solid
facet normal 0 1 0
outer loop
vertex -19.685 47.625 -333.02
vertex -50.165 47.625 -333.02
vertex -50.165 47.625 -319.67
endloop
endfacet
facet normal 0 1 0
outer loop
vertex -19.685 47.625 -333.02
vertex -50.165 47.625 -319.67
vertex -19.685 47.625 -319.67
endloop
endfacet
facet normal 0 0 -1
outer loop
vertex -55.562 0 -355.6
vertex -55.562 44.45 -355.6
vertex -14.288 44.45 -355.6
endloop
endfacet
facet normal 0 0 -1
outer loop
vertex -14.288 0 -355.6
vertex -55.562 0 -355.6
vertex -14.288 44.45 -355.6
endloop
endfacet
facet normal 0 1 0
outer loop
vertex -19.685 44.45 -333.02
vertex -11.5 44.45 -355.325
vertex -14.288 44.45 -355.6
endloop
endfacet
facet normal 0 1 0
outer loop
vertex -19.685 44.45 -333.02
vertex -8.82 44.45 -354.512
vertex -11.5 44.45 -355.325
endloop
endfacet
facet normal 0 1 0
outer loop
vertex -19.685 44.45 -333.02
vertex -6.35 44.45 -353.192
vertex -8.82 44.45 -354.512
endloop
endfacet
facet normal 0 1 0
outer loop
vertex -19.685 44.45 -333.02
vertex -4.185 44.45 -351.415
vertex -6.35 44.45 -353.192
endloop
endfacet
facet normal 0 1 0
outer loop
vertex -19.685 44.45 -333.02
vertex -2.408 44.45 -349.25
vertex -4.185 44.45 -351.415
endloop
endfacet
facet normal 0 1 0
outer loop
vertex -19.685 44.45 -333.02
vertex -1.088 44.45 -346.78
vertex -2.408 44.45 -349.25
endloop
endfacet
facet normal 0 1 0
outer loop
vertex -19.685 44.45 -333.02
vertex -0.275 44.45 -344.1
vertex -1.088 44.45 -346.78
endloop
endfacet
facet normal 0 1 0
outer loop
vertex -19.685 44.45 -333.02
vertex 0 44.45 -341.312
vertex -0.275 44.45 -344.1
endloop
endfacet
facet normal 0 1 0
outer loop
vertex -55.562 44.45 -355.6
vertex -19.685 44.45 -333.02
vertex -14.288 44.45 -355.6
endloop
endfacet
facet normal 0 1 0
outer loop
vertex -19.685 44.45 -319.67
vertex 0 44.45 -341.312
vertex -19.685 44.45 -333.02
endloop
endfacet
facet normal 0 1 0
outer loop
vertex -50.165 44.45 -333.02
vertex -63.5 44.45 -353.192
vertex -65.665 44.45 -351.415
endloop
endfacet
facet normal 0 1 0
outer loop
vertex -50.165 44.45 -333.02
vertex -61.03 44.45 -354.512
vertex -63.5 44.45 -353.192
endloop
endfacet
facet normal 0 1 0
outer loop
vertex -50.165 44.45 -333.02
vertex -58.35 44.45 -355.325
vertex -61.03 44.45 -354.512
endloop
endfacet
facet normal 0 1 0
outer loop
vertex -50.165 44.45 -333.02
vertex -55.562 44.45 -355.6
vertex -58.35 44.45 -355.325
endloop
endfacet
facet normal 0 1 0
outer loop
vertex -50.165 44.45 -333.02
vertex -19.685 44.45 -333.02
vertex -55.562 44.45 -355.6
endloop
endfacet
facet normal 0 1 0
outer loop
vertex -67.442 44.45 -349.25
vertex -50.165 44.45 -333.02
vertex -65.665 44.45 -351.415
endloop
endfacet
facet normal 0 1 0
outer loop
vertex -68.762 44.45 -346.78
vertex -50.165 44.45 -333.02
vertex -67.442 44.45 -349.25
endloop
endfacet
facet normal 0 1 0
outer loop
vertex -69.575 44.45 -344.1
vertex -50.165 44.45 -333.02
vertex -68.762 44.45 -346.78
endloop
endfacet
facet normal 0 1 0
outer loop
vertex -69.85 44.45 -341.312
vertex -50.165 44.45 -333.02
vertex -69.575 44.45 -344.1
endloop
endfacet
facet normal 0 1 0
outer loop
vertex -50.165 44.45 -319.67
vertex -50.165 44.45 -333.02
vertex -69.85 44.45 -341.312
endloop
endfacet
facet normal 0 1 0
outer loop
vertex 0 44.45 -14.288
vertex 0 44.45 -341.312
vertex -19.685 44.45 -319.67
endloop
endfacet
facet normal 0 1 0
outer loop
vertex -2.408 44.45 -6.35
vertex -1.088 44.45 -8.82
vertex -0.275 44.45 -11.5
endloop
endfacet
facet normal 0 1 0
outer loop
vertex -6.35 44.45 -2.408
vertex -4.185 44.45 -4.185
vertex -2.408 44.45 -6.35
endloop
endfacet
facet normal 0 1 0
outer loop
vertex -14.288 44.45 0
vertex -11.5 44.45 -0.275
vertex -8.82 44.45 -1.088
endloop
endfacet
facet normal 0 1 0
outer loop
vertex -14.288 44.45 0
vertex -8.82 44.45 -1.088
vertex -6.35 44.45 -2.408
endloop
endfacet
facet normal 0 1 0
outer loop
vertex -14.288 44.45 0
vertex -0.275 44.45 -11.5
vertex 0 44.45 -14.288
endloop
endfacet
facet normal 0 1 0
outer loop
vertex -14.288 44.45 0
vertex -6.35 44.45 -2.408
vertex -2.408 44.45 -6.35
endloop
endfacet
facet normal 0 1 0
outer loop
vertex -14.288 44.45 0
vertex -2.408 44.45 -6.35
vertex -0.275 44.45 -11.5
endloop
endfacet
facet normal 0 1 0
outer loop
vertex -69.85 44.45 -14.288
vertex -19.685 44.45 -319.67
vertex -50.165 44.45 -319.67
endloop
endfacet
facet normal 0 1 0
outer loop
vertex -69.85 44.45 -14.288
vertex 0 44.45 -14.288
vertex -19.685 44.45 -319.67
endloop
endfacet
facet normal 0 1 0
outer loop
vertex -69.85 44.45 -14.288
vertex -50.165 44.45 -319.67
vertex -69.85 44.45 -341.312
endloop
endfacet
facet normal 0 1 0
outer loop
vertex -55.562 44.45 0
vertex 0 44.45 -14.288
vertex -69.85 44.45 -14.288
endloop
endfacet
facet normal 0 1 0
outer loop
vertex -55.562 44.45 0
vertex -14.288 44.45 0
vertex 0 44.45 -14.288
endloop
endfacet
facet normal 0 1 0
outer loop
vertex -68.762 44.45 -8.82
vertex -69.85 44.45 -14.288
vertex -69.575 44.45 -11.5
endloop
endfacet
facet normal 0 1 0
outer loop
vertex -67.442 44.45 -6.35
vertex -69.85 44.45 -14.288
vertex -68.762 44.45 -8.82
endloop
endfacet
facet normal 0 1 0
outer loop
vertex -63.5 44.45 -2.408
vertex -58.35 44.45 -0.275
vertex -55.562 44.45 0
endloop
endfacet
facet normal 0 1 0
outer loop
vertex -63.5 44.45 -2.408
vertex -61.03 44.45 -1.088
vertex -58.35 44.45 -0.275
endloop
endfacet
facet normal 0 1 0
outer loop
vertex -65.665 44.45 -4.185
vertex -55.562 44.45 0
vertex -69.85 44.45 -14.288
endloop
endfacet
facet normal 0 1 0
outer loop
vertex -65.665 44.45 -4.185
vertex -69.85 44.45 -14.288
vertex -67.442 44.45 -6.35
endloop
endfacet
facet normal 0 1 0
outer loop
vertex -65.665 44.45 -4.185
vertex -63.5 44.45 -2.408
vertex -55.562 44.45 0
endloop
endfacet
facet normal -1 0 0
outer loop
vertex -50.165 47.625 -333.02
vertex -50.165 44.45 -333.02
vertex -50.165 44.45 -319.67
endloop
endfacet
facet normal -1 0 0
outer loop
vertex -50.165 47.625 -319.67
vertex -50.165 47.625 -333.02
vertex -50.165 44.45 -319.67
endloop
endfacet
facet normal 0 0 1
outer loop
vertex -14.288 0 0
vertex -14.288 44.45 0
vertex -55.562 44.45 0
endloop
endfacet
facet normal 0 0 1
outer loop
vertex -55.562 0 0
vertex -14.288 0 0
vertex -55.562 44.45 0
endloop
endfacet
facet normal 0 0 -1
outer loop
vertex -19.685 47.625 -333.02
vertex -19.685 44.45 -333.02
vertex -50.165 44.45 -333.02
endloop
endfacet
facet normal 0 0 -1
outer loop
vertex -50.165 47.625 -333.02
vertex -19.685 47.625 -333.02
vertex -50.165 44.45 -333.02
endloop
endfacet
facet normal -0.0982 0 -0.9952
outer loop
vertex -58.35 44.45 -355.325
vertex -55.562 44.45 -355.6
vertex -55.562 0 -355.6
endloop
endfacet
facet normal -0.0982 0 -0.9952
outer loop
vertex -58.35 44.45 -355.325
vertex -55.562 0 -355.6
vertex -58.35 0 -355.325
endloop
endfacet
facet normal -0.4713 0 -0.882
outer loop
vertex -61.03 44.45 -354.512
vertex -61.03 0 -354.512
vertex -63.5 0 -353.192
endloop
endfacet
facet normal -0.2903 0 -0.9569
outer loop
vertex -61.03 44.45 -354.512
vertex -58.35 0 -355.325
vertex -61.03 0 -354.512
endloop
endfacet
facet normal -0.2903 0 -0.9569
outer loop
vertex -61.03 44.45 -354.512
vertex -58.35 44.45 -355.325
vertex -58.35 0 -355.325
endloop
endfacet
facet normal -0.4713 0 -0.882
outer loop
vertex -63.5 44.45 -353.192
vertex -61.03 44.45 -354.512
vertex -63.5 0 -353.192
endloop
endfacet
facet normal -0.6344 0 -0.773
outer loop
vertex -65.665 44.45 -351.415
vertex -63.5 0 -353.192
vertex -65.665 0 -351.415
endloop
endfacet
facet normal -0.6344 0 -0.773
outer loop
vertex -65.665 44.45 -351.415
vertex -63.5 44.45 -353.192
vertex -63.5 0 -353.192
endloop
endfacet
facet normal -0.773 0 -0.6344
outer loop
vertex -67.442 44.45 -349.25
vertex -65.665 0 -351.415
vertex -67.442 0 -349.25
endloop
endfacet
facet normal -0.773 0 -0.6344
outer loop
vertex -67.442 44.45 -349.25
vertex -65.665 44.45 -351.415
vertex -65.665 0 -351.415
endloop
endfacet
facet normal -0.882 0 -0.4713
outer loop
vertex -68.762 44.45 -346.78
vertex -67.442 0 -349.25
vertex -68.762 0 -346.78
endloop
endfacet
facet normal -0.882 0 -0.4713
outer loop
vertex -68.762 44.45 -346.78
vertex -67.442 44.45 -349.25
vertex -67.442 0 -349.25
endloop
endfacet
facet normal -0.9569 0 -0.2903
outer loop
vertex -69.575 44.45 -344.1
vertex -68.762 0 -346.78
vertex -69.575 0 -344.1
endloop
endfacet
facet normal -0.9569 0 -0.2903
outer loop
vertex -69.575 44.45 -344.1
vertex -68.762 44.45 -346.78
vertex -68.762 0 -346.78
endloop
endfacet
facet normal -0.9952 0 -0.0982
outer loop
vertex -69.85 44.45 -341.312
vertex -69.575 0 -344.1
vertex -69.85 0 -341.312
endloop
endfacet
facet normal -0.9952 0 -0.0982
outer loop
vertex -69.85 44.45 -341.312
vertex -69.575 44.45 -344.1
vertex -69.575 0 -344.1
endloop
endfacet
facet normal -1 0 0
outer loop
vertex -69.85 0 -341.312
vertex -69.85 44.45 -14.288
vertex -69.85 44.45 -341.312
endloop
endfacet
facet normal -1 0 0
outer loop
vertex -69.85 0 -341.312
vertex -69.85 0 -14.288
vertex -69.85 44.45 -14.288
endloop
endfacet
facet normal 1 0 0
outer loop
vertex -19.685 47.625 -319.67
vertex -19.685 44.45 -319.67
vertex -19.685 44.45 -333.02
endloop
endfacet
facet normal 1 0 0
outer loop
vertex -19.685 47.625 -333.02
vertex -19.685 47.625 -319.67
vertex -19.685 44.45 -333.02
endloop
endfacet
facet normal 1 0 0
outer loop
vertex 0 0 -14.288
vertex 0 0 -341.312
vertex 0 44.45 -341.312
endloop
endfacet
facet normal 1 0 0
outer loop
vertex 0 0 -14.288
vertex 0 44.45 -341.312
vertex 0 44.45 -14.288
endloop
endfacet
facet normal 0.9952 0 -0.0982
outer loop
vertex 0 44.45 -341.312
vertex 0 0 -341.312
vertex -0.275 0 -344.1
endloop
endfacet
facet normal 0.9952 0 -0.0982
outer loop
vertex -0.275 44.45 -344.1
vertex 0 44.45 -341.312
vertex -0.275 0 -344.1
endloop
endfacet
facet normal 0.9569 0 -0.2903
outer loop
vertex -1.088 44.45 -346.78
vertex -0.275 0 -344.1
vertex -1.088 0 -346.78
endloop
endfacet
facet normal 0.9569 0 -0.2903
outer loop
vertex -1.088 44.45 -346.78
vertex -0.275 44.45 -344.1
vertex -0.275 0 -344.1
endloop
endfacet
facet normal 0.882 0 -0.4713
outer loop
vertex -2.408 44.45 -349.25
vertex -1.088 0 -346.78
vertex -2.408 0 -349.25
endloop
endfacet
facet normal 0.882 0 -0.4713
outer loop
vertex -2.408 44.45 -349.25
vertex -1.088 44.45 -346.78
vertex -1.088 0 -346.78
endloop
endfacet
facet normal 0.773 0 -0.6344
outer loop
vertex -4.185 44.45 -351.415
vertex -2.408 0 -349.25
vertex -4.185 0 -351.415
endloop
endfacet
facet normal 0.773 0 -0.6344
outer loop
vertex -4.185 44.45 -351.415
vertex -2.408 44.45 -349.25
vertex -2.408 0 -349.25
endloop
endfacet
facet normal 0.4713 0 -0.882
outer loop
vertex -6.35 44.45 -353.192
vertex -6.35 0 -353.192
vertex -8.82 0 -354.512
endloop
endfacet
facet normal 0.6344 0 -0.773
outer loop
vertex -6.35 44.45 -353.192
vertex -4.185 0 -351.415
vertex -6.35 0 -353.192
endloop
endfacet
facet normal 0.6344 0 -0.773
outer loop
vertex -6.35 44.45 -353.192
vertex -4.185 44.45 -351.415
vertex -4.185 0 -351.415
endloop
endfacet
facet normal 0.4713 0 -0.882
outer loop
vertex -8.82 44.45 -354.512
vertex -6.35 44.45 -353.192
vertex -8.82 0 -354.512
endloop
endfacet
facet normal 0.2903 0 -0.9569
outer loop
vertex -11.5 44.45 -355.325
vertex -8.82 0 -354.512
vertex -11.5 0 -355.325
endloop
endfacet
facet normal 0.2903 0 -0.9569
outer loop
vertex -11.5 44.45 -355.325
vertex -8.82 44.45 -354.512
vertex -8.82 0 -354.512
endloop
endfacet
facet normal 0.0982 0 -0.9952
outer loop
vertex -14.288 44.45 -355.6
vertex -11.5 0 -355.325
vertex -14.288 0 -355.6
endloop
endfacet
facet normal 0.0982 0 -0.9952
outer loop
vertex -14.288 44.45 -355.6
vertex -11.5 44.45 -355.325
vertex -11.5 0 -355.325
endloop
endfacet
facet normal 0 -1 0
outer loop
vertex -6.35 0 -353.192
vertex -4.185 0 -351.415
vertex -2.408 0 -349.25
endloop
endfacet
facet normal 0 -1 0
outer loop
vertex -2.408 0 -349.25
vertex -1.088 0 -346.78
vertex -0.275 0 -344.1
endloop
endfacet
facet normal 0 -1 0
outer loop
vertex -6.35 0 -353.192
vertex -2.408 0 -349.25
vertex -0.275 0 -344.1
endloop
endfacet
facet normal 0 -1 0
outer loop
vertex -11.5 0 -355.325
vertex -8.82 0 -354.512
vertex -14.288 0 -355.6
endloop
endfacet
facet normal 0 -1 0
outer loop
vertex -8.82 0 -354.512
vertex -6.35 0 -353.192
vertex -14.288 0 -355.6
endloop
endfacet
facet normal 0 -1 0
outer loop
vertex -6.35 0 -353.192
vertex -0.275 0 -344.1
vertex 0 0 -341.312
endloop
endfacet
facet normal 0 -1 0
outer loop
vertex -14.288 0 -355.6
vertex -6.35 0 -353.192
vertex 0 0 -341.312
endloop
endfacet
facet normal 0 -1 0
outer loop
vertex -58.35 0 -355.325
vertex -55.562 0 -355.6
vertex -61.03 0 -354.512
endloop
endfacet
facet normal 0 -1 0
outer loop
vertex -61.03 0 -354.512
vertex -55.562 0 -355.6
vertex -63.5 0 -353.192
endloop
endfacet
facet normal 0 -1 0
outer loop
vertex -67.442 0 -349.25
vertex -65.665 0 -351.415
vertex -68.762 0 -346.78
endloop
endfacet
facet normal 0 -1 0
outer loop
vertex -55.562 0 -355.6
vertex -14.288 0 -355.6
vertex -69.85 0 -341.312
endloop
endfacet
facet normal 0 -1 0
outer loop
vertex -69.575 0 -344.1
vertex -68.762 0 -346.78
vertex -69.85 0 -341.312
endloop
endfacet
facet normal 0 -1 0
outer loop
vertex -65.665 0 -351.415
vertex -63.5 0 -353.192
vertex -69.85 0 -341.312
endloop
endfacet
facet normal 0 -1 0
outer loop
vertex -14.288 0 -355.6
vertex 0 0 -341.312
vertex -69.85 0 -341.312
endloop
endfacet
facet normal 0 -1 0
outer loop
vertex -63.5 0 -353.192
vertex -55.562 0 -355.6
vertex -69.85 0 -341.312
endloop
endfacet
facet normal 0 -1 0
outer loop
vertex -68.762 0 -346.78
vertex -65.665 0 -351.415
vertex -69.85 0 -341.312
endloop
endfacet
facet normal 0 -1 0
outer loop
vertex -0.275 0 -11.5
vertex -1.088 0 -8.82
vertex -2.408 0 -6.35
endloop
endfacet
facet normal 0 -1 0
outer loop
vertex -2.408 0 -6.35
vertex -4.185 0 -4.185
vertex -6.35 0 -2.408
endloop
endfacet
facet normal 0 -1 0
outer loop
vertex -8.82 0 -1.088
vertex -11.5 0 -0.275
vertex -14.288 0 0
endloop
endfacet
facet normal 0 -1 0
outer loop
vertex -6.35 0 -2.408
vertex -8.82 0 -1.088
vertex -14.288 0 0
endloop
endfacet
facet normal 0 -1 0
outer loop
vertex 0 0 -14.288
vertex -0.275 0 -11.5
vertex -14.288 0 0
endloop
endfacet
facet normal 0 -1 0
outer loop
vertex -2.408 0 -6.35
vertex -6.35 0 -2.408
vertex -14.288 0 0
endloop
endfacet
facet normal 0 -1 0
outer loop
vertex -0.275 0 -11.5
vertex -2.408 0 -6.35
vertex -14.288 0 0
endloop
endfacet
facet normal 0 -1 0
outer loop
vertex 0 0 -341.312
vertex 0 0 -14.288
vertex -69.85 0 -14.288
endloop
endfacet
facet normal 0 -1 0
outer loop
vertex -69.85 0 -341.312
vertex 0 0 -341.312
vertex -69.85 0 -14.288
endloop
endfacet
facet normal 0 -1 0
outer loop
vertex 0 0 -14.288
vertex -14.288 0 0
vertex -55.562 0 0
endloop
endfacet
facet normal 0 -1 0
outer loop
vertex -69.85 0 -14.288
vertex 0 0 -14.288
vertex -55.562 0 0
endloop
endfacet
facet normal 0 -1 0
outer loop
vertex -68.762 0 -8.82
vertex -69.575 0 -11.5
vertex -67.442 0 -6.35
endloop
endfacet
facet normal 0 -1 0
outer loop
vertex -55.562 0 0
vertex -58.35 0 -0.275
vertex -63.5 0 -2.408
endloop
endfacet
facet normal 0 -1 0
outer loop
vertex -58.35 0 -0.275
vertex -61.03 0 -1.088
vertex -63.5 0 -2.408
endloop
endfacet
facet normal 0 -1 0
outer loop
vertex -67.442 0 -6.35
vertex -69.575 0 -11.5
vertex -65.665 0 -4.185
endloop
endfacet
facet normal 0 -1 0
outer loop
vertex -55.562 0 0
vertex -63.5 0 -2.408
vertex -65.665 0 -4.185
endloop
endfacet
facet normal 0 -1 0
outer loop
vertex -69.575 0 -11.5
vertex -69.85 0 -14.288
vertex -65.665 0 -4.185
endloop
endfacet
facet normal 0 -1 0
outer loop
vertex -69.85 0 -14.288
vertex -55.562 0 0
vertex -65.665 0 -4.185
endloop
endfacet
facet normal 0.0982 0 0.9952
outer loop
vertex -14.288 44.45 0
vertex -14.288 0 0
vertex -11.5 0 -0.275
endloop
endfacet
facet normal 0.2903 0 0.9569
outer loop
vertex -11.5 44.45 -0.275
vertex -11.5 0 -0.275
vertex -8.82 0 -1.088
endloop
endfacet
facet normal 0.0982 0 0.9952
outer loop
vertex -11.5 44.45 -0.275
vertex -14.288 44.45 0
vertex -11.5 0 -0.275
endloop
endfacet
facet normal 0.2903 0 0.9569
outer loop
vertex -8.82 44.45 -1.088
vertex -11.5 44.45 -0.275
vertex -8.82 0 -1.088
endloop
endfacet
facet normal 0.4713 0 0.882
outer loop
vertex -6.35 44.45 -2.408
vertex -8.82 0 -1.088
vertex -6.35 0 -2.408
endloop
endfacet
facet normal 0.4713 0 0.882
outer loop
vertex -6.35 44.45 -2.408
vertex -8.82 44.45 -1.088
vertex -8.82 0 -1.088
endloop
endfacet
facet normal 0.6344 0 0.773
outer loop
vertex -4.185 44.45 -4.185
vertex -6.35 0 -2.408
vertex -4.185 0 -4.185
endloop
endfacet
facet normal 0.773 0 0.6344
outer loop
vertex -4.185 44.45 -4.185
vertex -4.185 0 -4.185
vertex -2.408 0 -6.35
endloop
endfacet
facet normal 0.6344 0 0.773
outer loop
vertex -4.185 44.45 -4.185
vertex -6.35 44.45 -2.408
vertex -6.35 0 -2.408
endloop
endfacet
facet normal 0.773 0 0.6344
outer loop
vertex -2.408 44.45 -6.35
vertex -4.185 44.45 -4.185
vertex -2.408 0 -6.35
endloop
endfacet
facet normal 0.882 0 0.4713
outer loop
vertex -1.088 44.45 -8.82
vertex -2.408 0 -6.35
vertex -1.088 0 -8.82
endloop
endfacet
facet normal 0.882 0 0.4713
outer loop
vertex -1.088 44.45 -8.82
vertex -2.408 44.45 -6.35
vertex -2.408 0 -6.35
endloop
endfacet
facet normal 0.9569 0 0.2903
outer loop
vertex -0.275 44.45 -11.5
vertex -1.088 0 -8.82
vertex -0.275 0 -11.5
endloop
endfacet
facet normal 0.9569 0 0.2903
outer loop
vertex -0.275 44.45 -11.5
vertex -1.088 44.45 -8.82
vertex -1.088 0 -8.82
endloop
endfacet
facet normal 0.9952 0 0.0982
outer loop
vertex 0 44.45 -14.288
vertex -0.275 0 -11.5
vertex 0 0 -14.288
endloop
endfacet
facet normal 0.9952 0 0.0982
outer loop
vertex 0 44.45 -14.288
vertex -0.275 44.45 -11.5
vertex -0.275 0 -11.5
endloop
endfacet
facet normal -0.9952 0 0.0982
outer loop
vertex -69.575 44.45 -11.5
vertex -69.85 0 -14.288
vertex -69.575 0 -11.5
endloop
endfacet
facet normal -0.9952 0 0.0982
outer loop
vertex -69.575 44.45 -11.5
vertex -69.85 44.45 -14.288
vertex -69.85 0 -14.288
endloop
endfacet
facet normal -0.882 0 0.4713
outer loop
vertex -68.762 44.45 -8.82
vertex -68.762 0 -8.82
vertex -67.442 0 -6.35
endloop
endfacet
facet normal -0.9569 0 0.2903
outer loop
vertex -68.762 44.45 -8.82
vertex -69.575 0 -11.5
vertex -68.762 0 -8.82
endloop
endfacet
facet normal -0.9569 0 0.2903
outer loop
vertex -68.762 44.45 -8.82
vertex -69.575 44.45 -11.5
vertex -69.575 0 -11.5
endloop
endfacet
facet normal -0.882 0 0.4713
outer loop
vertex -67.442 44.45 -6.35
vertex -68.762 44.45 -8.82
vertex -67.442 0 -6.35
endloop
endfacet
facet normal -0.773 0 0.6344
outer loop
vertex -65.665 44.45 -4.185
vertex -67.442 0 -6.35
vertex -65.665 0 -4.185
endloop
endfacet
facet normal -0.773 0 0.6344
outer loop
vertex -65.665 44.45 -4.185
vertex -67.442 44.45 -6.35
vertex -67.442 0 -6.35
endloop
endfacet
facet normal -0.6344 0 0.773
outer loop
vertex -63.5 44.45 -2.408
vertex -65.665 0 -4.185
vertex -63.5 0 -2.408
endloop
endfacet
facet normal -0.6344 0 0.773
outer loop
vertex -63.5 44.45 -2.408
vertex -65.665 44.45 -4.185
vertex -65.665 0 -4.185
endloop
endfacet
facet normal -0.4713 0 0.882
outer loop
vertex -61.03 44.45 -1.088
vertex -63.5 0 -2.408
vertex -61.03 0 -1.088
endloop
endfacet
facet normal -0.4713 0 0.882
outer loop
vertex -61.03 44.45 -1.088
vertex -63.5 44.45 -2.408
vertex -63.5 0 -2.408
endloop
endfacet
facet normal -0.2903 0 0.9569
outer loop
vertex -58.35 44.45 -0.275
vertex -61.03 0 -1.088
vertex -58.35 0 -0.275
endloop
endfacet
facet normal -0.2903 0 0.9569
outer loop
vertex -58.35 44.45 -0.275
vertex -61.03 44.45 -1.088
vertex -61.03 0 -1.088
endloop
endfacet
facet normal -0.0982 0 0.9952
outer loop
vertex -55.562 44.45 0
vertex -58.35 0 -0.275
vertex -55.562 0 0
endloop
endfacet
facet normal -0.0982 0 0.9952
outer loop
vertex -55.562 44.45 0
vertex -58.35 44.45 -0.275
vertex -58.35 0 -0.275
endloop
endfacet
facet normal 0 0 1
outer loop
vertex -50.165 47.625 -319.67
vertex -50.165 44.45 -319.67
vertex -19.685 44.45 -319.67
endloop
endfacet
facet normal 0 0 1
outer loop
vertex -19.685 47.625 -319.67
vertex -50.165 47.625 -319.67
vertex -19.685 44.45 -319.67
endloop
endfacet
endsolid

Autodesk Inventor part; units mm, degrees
ref_plane "YZ Plane" through (0, 0, 0) normal (1, 0, 0) x (0, 1, 0)
ref_plane "XZ Plane" through (0, 0, 0) normal (0, 1, 0) x (-1, 0, 0)
ref_plane "XY Plane" through (0, 0, 0) normal (0, 0, 1) x (1, 0, 0)
sketch "Sketch1" plane through (0, 0, 0) normal (0, 1, 0) x (-1, 0, 0)
  line L0 (0, 0) -> (69.85, 0)
  line L1 (69.85, 0) -> (69.85, -355.6)
  line L2 (69.85, -355.6) -> (0, -355.6)
  line L3 (0, -355.6) -> (0, 0)
  dimension "d0" = 69.85
  dimension "d1" = 355.6
extrude "Extrusion1" add sketch "Sketch1" along normal blind 44.45
fillet "Fillet1" radius 14.2875 4 edges at (0, 22.225, 0) (-69.85, 22.225, 0) (0, 22.225, -355.6) (-69.85, 22.225, -355.6)
sketch "Sketch3" plane through (0, 44.45, 0) normal (0, 1, 0) x (1, 0, 0)
  arc A0 (-55.5625, 355.6) -> (-69.85, 341.3125) centre (-55.5625, 341.3125) ccw projected
  line L0 (-69.85, 341.3125) -> (-69.85, 14.2875) projected
  arc A1 (-69.85, 14.2875) -> (-55.5625, 0) centre (-55.5625, 14.2875) ccw projected
  line L1 (-55.5625, 0) -> (-14.2875, 0) projected
  arc A2 (-14.2875, 0) -> (0, 14.2875) centre (-14.2875, 14.2875) ccw projected
  line L2 (0, 14.2875) -> (0, 341.3125) projected
  arc A3 (0, 341.3125) -> (-14.2875, 355.6) centre (-14.2875, 341.3125) ccw projected
  line L3 (-14.2875, 355.6) -> (-55.5625, 355.6) projected
  line L4 (-19.685, 333.0203) -> (-50.165, 333.0203)
  line L5 (-50.165, 333.0203) -> (-50.165, 319.6698)
  line L6 (-50.165, 319.6698) -> (-19.685, 319.6698)
  line L7 (-19.685, 319.6698) -> (-19.685, 333.0203)
  line L8 (-19.685, 333.0203) -> (-50.165, 319.6698) construction
  line L9 (-50.165, 333.0203) -> (-19.685, 319.6698) construction
  point P0 (0, 0)
  point P1 (-34.925, 326.345)
extrude "Extrusion3" add sketch "Sketch3" along normal blind 3.175 contours L7 L6 L5 L4
properties part number "power strip"
